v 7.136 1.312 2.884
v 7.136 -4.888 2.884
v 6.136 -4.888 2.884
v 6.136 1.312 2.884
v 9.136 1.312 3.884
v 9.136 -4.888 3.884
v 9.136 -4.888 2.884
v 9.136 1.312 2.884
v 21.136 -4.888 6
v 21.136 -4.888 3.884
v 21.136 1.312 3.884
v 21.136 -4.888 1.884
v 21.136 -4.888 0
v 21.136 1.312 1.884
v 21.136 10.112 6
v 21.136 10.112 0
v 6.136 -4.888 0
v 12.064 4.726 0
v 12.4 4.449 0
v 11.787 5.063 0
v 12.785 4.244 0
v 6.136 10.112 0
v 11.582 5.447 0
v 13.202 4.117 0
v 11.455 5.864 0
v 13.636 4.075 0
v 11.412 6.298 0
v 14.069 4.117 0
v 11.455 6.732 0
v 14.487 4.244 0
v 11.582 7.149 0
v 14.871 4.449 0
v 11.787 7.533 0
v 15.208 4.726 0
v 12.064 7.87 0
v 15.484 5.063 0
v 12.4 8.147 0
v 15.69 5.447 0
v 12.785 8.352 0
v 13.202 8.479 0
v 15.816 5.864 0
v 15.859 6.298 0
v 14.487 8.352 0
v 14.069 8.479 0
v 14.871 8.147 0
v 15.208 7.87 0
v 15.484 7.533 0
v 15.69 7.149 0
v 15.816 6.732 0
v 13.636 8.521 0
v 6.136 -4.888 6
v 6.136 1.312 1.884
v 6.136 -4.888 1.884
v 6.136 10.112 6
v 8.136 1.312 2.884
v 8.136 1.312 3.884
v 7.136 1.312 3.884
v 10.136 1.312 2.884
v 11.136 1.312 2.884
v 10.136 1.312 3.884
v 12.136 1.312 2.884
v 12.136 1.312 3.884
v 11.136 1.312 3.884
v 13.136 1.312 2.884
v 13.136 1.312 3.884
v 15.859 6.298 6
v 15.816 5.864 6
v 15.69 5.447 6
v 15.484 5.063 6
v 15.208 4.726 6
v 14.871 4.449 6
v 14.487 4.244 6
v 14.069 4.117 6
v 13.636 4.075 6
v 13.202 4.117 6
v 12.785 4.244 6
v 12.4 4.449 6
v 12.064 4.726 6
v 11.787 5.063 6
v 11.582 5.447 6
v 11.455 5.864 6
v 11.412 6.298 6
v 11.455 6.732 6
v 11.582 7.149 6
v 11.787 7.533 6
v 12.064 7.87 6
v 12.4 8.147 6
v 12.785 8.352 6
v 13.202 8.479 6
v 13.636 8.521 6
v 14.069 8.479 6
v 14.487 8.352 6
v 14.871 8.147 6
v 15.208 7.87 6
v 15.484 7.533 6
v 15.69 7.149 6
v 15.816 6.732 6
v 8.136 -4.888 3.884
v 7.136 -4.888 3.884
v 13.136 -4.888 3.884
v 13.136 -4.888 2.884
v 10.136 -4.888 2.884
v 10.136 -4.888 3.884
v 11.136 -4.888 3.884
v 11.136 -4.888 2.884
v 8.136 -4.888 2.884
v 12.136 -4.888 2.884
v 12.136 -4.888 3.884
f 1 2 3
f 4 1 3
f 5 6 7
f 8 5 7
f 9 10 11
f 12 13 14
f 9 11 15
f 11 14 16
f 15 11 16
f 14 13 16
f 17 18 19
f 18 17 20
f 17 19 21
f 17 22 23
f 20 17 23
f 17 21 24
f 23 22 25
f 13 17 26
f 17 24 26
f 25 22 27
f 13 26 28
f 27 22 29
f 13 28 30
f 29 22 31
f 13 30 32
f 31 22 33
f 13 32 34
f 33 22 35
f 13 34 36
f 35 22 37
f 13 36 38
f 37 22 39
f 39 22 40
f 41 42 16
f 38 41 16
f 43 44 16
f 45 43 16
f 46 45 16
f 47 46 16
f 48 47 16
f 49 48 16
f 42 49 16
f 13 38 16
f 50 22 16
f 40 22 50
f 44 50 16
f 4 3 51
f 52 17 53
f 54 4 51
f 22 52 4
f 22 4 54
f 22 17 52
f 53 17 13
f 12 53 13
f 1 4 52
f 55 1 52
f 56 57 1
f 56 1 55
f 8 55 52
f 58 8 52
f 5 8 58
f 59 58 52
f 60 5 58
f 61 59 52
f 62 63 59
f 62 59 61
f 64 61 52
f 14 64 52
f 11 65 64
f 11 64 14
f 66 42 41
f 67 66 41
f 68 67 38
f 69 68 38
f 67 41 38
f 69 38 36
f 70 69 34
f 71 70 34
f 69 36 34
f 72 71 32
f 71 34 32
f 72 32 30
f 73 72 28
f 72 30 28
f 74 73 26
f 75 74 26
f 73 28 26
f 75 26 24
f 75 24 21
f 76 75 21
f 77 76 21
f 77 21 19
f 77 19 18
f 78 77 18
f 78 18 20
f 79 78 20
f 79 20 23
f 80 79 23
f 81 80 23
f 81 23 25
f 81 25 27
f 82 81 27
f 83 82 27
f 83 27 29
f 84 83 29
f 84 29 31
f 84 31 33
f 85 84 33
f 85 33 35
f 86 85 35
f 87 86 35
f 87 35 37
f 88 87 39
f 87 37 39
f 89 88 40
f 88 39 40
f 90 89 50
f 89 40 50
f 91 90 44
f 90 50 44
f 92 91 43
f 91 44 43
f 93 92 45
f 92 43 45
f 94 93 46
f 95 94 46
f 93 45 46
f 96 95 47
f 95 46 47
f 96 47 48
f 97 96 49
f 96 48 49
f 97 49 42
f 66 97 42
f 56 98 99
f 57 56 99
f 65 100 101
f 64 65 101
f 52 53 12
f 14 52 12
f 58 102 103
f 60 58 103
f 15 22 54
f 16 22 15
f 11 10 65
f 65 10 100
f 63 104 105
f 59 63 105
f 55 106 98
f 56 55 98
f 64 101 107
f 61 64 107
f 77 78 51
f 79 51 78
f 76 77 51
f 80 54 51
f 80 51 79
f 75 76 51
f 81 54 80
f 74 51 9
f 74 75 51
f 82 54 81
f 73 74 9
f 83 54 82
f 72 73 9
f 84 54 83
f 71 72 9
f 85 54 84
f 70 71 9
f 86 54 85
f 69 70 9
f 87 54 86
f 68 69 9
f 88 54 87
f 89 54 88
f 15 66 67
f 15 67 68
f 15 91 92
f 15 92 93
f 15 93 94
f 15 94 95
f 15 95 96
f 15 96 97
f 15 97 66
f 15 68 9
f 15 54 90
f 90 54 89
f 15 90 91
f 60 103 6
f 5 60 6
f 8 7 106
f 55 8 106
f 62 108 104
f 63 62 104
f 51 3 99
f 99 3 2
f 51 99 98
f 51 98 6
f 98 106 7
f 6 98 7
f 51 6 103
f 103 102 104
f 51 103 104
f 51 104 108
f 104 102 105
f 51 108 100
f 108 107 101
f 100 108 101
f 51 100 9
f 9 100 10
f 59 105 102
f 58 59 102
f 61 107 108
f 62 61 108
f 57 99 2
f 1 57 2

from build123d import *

# Parameters (mm, degrees)
F0_W     = 15
F0_H     = 15
F1_DEPTH = 6
F3_DEPTH = 6.2
F4_R     = 2.223391
F5_DEPTH = 25


with BuildPart() as f1:
    # F0 (on Top) → F1 (new body)
    with BuildSketch(Plane.XY):
        with Locations((13.635715, 2.612354)):
            Rectangle(F0_W, F0_H)
    extrude(amount=F1_DEPTH)

    # F2 (on face) → F3 (cut)
    with BuildSketch(Plane.XZ.offset(4.887646)):
        Polygon((6.135715, 2.883776), (6.135715, 1.883776), (21.135715, 1.883776), (21.135715, 3.883776), (14.135715, 3.883776), (13.135715, 3.883776), (13.135715, 2.883776), (12.135715, 2.883776), (12.135715, 3.883776), (11.135715, 3.883776), (11.135715, 2.883776), (10.135715, 2.883776), (10.135715, 3.883776), (9.135715, 3.883776), (9.135715, 2.883776), (8.135715, 2.883776), (8.135715, 3.883776), (7.135715, 3.883776), (7.135715, 2.883776), align=None)
    extrude(amount=-F3_DEPTH, mode=Mode.SUBTRACT)

    # F4 (on face) → F5 (cut)
    with BuildSketch(Plane(origin=(0, 0, 0), x_dir=(1, 0, 0), z_dir=(0, 0, -1))):
        with Locations((13.635715, -6.298021)):
            Circle(F4_R)
    extrude(amount=-F5_DEPTH, mode=Mode.SUBTRACT)


solid = f1.part
